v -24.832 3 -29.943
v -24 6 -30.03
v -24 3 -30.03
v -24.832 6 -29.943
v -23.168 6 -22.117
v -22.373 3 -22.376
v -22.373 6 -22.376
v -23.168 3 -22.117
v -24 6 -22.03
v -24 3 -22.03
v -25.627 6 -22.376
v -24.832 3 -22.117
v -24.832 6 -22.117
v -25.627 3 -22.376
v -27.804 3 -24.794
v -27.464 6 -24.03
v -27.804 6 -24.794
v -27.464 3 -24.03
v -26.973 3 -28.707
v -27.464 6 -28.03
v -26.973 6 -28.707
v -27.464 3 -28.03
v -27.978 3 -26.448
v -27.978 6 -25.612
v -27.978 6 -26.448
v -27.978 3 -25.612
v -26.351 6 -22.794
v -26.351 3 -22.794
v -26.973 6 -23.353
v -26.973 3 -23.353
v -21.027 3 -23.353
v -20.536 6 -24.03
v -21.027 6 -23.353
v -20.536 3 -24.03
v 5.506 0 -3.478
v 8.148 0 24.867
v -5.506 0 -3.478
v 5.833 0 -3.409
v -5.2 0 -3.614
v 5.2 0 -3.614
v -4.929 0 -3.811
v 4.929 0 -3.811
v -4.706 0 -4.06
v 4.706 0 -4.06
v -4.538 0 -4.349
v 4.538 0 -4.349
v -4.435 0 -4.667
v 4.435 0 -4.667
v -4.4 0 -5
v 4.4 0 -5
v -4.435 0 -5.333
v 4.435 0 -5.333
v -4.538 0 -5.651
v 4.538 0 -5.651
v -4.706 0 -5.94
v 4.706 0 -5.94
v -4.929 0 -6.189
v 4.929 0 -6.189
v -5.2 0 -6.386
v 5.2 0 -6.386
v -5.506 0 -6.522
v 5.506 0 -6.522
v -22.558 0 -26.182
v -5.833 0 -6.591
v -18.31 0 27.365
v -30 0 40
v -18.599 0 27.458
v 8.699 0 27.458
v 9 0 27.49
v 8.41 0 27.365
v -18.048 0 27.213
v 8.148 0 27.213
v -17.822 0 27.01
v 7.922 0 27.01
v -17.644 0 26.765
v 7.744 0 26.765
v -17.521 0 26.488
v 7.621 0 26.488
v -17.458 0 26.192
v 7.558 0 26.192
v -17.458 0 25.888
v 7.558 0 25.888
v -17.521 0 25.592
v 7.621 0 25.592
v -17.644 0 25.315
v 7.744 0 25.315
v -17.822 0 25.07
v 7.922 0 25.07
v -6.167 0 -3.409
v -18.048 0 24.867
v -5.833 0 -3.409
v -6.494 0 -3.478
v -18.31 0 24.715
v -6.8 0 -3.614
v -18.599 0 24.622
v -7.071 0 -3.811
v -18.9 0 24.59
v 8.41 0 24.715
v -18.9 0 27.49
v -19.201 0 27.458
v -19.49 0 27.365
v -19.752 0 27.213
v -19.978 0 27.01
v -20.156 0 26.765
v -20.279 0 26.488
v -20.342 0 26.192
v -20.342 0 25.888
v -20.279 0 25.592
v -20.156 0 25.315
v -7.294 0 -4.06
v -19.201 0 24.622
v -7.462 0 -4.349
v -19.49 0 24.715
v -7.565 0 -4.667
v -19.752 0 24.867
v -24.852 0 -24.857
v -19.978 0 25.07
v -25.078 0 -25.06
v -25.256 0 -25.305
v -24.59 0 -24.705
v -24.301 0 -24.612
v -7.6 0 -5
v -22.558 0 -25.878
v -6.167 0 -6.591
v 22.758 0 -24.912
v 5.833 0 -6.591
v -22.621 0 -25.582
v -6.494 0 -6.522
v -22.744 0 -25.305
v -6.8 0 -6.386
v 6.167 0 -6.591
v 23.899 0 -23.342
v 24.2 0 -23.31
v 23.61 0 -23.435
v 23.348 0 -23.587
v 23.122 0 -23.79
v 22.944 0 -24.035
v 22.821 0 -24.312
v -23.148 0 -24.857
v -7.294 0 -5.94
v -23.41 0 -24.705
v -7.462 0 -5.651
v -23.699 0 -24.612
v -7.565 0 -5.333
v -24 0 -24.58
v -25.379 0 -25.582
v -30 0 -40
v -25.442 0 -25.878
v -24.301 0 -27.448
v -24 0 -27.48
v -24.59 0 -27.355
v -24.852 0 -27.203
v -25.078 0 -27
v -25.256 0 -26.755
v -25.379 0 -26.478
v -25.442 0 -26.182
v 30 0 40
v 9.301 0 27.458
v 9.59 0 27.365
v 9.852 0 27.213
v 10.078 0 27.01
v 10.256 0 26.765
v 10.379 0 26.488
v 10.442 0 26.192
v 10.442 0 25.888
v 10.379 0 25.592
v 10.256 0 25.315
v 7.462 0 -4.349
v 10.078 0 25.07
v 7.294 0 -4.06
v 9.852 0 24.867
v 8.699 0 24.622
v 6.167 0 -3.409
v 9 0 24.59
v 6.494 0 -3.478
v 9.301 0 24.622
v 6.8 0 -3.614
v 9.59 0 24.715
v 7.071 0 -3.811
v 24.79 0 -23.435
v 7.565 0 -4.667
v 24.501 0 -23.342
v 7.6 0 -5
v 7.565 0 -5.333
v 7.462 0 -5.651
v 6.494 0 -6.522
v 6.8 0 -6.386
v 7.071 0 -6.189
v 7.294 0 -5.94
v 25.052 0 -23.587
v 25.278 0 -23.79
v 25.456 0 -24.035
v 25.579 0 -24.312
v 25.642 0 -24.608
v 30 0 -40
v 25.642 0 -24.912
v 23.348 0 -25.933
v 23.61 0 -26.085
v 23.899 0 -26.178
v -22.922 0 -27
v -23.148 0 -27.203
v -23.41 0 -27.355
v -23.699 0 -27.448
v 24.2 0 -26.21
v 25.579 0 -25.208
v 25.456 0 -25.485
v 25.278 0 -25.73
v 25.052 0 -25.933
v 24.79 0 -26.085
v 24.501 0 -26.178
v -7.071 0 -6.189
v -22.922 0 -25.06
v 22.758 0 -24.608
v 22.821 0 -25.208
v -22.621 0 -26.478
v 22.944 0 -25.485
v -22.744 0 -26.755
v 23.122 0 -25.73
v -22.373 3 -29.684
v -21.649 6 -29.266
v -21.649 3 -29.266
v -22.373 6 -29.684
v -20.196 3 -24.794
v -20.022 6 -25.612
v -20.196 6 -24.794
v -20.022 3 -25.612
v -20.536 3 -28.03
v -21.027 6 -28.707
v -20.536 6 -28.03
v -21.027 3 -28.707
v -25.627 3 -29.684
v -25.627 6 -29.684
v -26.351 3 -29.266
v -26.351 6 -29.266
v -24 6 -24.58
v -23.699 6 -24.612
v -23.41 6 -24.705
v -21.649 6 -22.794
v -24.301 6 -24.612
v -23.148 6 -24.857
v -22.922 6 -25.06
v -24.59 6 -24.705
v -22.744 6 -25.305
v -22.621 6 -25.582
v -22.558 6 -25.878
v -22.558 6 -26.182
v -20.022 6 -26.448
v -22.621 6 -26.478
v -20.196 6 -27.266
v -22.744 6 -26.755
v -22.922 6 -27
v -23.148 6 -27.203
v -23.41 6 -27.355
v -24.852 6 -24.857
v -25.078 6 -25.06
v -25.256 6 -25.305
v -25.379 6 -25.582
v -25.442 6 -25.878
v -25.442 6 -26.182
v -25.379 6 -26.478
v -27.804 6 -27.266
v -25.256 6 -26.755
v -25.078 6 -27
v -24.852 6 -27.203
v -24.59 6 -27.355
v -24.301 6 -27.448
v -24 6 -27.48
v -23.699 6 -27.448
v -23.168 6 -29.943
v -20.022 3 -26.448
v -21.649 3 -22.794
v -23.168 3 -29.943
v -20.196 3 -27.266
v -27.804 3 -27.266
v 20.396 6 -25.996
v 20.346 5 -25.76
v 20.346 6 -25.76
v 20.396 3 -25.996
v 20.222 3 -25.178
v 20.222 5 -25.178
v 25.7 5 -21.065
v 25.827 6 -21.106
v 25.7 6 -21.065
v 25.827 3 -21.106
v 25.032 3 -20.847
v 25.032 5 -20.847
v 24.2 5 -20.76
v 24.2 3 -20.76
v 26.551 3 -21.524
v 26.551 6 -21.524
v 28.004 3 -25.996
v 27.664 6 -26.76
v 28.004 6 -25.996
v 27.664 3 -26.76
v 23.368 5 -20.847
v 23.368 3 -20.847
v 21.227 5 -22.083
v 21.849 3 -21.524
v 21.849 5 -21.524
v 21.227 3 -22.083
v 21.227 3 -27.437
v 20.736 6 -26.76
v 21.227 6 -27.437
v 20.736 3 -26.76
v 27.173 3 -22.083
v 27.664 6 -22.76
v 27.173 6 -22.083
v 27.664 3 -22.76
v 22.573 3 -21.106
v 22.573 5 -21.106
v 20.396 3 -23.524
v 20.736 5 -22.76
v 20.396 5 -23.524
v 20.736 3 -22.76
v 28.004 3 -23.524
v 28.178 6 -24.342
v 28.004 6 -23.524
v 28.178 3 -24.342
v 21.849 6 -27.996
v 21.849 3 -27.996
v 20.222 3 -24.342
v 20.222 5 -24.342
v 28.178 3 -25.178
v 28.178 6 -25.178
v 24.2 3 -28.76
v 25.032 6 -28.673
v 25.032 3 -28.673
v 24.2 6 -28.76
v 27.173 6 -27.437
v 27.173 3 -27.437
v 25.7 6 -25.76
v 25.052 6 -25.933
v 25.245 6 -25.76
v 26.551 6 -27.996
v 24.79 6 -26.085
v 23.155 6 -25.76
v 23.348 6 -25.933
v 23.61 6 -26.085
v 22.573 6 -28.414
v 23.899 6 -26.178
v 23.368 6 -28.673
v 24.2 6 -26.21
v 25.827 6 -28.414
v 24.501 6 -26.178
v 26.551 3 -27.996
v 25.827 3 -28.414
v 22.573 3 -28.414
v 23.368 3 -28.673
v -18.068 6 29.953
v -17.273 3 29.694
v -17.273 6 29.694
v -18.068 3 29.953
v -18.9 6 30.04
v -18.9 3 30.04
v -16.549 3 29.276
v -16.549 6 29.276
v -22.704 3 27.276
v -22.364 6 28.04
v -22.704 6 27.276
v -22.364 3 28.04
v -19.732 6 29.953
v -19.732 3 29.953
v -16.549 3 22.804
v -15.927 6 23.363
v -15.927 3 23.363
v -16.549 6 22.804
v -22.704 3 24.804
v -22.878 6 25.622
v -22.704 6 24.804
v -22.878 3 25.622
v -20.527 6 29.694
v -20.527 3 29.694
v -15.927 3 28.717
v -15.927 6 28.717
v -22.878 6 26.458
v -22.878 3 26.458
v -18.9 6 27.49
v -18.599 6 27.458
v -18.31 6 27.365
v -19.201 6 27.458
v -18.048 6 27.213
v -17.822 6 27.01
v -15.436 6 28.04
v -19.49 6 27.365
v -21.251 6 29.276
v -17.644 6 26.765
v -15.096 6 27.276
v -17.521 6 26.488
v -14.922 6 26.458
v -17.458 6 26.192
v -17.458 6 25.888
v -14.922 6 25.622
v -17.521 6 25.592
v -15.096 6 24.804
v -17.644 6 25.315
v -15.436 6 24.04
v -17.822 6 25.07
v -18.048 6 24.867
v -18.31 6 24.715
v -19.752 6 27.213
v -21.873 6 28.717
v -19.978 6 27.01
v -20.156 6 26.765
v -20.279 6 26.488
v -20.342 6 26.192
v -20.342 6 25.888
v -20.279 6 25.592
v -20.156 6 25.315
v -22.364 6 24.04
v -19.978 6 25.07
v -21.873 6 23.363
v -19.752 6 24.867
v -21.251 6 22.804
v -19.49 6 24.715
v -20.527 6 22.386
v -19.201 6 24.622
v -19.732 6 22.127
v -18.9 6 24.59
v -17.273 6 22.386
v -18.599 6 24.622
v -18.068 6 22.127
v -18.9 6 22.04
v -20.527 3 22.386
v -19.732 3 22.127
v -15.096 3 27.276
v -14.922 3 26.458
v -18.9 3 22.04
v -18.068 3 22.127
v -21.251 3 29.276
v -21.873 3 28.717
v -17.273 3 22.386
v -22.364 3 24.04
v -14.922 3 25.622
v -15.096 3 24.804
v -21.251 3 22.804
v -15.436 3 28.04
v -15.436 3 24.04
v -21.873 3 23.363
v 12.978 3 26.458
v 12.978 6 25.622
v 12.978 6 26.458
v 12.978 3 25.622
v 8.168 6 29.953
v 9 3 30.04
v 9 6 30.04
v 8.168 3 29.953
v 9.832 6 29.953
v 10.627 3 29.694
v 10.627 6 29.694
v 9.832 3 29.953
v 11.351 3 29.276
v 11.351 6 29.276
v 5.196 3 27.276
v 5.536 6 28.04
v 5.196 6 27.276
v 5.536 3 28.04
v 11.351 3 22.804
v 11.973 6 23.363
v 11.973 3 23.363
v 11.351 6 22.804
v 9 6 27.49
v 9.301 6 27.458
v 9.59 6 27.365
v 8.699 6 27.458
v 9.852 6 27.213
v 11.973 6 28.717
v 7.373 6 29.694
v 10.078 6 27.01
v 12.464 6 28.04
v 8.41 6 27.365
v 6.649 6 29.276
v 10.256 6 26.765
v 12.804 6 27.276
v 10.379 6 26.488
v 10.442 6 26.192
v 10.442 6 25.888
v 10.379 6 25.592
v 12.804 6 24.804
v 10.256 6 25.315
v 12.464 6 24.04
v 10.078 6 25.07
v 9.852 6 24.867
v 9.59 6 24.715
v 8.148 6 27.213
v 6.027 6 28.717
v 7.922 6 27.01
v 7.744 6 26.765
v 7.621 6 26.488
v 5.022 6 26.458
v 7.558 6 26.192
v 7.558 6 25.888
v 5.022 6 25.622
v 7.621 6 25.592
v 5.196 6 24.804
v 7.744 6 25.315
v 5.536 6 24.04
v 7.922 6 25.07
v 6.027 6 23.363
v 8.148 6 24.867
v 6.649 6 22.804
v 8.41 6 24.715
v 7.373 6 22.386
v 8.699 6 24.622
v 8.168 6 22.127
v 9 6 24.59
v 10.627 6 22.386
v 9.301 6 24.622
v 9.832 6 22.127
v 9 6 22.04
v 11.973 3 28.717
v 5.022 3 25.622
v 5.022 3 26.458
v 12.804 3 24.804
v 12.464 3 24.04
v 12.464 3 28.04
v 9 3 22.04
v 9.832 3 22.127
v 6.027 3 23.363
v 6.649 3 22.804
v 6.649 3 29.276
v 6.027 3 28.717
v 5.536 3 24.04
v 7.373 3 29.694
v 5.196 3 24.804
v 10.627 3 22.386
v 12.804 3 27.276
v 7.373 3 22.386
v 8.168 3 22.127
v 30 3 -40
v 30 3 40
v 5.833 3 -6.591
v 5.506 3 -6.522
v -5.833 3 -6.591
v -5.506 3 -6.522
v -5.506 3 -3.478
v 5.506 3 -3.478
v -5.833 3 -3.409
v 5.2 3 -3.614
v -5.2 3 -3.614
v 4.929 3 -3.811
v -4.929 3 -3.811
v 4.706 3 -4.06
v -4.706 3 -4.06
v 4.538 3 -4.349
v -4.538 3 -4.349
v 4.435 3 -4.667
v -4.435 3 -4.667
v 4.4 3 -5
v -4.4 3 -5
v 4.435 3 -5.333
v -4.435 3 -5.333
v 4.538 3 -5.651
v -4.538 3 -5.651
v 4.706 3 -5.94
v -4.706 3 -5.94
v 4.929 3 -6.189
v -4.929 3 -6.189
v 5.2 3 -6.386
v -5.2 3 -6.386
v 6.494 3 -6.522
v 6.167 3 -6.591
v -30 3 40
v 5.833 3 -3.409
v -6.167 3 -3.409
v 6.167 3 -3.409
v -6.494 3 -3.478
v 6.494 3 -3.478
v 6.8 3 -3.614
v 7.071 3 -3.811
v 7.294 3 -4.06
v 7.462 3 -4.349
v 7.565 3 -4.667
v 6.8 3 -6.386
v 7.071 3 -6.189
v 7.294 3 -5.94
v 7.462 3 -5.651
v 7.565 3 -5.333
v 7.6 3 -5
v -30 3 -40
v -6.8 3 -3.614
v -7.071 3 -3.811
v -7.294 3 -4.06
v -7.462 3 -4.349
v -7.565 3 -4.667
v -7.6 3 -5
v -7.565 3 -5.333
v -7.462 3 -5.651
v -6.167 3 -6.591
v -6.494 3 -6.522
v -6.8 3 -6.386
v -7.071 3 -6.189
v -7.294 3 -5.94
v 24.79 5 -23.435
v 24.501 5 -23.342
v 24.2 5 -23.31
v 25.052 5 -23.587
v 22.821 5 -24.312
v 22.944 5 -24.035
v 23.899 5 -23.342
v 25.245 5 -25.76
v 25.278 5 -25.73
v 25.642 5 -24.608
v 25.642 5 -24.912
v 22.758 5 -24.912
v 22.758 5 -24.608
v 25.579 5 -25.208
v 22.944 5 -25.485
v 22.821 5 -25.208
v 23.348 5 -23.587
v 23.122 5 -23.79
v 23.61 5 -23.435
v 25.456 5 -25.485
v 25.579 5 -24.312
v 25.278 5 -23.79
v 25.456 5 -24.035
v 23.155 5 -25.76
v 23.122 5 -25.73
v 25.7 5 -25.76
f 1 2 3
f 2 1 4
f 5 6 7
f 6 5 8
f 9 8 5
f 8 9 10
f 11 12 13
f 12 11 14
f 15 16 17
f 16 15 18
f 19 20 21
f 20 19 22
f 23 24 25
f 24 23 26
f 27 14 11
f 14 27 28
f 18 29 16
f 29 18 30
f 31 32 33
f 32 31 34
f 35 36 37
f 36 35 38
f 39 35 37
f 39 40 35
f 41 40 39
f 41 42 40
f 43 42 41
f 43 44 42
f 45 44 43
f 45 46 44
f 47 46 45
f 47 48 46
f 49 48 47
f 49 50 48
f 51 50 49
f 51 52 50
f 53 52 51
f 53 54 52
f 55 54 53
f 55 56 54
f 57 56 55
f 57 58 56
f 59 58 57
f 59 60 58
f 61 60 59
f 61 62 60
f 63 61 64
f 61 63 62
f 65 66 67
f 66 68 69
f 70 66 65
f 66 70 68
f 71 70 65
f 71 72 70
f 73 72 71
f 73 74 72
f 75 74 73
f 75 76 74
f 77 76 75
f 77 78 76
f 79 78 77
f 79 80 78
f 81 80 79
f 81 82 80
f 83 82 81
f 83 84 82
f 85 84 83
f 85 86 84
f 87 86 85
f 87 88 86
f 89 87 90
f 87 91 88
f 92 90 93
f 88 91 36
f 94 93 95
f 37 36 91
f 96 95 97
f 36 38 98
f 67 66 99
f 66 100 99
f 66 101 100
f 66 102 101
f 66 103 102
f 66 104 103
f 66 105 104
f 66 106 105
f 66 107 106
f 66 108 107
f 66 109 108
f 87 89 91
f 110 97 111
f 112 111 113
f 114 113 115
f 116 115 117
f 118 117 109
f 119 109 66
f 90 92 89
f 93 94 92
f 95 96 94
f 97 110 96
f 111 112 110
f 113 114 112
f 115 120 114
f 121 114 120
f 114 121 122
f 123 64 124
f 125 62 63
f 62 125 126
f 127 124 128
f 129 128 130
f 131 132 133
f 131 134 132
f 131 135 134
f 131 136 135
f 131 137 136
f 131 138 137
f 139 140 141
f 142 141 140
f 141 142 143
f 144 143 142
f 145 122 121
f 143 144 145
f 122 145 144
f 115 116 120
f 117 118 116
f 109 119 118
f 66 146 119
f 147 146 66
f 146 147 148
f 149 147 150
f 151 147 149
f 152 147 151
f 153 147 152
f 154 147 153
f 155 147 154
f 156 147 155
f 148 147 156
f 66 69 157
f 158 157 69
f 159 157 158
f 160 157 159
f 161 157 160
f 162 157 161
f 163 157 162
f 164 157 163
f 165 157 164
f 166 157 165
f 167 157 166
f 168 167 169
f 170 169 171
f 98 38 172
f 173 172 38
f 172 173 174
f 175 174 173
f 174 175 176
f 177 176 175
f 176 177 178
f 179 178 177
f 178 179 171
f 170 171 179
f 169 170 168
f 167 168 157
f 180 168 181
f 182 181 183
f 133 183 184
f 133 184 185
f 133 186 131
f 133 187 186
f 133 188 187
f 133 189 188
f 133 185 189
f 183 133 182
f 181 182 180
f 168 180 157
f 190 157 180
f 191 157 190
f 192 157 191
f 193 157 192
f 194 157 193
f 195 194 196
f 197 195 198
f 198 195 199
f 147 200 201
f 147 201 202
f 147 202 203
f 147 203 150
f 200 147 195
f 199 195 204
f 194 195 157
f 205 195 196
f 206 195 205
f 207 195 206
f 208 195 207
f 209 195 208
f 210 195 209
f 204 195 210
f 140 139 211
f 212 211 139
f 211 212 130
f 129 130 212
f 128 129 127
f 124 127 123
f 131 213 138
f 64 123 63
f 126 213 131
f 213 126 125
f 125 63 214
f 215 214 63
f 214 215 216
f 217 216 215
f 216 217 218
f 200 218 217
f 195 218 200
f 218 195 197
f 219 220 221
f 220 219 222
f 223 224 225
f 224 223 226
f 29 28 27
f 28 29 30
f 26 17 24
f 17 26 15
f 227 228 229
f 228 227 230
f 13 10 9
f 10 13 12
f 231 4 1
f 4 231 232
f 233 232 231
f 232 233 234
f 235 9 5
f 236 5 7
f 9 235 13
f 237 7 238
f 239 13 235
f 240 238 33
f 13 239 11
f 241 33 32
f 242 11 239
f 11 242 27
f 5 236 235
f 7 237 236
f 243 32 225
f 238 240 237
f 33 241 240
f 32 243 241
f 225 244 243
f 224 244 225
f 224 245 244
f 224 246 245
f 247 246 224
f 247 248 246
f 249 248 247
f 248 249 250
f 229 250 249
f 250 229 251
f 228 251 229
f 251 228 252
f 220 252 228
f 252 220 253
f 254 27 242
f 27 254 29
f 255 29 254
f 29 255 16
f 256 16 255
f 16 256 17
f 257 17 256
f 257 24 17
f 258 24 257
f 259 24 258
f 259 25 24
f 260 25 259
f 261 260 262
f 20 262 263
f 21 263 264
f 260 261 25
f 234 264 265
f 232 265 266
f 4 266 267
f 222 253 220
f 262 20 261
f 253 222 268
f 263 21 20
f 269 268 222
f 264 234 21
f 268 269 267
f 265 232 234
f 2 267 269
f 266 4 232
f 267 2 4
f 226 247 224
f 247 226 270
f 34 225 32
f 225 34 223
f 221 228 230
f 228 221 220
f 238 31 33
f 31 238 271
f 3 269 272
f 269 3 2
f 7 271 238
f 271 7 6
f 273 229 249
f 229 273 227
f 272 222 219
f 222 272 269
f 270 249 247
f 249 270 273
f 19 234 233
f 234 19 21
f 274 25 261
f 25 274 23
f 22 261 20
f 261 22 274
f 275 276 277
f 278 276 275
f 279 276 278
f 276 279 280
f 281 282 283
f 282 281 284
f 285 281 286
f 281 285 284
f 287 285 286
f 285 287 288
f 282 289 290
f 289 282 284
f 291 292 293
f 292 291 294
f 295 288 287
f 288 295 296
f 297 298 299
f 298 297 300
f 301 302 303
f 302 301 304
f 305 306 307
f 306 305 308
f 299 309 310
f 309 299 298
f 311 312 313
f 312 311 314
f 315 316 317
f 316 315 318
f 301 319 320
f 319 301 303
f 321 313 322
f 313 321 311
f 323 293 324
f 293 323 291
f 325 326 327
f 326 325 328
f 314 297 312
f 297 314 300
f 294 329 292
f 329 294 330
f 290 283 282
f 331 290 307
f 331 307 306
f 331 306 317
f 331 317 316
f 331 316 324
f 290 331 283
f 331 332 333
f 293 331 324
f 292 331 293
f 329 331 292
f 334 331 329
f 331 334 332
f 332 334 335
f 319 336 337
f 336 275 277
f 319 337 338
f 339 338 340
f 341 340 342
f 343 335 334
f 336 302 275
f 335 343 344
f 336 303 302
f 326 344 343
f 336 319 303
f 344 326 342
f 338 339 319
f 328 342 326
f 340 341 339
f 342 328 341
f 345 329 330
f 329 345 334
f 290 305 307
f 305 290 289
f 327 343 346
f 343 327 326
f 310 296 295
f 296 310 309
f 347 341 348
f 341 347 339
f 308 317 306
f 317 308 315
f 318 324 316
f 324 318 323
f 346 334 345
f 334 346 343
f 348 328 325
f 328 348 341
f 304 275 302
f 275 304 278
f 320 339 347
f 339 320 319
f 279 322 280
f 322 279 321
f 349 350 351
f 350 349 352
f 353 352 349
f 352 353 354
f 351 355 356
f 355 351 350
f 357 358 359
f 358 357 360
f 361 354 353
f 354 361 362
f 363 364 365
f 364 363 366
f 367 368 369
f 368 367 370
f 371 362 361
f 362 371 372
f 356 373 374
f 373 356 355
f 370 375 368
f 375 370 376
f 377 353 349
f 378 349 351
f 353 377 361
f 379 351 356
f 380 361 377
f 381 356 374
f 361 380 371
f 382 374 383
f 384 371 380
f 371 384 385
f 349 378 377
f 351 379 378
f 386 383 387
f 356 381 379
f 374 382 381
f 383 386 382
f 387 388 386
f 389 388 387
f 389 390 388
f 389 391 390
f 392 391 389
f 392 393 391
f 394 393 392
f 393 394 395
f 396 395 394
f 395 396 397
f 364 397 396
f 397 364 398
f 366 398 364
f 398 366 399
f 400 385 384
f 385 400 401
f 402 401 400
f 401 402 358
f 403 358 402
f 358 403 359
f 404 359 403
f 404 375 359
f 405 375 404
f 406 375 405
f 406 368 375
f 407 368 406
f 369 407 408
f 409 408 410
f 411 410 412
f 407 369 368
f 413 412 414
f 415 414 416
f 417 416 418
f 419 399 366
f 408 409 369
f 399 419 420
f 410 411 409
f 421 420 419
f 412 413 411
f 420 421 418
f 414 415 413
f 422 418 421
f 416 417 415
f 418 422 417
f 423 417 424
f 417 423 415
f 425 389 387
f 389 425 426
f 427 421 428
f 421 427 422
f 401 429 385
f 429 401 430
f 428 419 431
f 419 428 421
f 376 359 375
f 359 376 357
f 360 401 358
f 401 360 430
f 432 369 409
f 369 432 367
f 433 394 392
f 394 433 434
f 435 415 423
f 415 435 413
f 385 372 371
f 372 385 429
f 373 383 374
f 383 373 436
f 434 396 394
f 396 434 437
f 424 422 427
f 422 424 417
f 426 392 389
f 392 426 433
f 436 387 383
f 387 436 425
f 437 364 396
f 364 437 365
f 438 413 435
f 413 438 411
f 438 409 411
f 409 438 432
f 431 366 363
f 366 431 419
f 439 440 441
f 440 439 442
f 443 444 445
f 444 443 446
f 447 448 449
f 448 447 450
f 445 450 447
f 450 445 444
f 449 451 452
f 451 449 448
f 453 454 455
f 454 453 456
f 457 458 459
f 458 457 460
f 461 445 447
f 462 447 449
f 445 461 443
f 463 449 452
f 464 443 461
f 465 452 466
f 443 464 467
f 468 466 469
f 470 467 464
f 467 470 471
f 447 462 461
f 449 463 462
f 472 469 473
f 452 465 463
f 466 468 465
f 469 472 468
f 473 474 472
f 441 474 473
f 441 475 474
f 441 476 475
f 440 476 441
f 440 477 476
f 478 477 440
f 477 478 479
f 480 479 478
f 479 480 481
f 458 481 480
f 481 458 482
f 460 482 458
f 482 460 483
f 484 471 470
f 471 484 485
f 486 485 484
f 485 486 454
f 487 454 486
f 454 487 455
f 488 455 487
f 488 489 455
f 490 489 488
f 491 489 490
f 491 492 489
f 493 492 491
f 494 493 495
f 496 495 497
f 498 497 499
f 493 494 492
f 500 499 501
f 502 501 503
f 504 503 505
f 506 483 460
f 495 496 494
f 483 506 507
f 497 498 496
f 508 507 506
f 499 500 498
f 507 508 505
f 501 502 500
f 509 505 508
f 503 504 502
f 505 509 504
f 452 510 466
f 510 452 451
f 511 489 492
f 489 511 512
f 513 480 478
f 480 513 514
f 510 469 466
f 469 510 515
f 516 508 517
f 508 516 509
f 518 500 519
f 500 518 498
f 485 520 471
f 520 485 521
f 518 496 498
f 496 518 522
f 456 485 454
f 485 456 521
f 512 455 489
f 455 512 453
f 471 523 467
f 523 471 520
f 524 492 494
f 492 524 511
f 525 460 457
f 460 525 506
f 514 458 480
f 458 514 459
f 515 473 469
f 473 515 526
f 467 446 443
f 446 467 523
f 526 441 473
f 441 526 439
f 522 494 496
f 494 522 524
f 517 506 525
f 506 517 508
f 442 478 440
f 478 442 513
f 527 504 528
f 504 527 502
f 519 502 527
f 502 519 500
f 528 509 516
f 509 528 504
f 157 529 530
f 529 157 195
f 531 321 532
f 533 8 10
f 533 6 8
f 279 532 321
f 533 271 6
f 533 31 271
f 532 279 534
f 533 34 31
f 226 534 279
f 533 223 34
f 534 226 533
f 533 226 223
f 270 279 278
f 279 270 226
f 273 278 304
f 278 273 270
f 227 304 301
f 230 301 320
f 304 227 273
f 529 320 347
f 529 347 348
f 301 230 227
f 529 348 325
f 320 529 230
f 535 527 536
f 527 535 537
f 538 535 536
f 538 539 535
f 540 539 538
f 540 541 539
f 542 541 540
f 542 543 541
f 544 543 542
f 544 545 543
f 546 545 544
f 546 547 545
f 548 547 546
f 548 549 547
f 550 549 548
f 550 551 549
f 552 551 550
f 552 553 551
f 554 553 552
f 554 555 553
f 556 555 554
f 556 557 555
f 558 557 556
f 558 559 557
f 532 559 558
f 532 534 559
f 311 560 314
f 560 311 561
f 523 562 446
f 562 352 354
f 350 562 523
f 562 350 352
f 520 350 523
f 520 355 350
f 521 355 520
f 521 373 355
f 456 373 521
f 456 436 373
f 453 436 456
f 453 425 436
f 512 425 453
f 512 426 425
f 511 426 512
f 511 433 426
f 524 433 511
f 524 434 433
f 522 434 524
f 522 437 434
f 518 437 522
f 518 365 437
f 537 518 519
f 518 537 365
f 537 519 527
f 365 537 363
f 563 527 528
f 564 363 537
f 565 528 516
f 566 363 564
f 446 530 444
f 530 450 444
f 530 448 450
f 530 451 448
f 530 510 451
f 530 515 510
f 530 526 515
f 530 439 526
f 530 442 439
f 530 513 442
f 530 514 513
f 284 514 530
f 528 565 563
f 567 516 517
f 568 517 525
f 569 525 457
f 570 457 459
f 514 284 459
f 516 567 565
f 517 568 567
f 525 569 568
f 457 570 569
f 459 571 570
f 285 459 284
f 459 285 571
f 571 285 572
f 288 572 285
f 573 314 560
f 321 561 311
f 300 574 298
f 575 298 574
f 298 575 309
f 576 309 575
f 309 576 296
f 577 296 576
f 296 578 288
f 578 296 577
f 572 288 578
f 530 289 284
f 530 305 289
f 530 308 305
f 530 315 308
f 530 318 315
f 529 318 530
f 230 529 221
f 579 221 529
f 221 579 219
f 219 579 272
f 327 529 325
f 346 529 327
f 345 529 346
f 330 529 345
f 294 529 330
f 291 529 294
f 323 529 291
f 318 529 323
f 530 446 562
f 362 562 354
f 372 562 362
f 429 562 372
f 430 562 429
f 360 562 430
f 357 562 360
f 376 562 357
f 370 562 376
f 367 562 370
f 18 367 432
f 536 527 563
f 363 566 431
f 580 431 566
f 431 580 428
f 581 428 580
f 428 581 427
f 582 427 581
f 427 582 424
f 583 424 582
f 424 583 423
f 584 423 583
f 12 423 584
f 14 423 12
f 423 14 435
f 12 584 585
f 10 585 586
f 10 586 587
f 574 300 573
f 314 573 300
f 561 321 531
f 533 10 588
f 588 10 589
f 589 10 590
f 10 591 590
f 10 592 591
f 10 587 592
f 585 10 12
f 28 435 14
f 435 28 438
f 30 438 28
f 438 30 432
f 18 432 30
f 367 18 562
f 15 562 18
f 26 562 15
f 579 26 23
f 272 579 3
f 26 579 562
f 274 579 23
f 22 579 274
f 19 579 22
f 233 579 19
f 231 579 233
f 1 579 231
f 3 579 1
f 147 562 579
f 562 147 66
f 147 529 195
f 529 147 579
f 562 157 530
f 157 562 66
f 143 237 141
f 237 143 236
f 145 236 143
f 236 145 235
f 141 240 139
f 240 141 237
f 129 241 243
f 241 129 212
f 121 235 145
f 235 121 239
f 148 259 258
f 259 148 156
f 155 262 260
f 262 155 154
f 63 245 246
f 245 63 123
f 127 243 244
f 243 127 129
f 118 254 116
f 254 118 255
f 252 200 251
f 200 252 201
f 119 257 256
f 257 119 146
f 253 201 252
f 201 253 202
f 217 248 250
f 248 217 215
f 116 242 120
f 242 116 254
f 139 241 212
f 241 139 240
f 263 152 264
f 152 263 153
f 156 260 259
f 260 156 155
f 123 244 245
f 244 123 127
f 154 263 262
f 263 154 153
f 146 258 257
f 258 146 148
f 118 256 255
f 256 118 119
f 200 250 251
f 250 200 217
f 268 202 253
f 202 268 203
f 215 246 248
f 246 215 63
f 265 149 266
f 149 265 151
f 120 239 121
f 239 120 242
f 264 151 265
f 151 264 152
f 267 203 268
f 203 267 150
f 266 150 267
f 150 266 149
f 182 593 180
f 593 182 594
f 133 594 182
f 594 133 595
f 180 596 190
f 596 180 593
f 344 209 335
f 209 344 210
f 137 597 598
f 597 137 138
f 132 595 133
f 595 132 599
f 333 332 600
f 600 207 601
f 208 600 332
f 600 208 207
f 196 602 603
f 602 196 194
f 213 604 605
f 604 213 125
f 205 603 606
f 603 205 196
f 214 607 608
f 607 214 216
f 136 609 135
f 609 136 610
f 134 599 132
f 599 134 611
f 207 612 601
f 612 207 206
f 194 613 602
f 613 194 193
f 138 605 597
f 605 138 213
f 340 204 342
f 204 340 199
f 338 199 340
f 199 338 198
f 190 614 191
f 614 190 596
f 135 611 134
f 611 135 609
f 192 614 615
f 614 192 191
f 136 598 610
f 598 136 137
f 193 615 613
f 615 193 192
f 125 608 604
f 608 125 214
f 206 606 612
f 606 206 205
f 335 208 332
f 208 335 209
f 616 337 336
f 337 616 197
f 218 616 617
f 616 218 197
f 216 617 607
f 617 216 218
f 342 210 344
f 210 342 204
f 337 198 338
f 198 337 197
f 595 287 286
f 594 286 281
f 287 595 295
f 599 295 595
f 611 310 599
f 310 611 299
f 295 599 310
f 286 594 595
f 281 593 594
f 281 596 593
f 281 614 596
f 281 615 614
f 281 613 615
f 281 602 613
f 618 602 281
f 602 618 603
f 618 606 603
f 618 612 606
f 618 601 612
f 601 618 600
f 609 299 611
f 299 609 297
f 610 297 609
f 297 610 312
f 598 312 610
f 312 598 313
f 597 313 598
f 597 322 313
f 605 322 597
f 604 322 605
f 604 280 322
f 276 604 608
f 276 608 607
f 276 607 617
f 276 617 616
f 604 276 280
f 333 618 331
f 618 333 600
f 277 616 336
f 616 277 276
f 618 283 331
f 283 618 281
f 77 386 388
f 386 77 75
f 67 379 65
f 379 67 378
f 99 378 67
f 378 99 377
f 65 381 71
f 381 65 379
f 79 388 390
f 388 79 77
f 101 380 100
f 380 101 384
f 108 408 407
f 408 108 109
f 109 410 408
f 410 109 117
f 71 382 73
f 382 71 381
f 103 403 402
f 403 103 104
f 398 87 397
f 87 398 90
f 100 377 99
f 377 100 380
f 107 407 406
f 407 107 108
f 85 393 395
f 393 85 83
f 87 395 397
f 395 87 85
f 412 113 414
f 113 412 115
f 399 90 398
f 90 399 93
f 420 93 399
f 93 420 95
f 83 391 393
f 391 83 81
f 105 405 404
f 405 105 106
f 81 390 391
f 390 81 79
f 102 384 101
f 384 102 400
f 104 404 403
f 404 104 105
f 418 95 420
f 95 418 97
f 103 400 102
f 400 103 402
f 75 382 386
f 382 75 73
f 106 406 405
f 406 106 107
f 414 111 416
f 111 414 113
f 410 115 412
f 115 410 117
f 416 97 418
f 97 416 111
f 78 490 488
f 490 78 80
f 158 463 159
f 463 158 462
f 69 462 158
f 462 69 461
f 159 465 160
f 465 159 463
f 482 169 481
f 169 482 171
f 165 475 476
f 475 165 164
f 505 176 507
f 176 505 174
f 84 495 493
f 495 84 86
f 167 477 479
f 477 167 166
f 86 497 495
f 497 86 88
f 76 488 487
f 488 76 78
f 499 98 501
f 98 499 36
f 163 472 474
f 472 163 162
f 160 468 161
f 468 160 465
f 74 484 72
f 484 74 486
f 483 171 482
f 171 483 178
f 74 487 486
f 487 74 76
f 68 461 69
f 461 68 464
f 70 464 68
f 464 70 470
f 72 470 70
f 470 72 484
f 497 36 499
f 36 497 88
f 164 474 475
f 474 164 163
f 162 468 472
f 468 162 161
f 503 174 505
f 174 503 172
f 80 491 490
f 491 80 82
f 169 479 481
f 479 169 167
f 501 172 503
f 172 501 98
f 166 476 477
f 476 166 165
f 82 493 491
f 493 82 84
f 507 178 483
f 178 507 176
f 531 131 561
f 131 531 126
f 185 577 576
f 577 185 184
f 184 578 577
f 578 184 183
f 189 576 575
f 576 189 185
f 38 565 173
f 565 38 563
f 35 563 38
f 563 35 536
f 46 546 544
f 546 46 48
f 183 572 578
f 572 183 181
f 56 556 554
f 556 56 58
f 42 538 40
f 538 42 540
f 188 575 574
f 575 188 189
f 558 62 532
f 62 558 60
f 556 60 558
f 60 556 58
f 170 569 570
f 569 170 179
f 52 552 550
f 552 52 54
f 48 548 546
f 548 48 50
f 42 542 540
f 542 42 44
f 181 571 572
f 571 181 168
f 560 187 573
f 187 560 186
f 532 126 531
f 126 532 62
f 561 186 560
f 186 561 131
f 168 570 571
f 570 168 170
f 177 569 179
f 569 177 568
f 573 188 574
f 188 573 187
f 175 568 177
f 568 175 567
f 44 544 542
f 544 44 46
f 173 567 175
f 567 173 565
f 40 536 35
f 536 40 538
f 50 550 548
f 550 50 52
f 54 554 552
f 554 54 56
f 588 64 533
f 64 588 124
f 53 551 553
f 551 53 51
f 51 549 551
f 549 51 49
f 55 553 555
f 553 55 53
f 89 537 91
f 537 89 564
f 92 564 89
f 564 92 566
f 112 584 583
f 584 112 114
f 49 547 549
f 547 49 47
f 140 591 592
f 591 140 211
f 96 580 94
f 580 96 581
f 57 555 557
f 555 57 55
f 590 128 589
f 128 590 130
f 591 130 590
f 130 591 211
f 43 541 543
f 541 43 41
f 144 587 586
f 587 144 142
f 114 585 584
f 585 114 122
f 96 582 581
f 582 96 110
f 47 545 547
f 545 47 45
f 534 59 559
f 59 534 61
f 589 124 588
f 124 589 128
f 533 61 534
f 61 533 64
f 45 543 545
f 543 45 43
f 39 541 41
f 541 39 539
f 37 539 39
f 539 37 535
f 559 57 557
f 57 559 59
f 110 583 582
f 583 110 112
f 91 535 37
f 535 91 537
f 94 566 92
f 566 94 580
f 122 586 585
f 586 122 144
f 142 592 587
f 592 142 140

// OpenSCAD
$fn=30;

//assembly
rotate([-90,0,0])arduino_plate();
//translate([0,-22.35,0])rotate([90,0,0])motor_support();
//translate([0,-40,-20])battery_holder();

module arduino_plate(){
difference(){
union(){
translate([0,0,1.5])cube([60,80,3],center=true);
translate([-26.5,40,0])rotate([0,0,-90]){
translate([13.97,2.5,0])cylinder(d=8,h=6);
translate([15.24,50.7,0])cylinder(d=8,h=6);
translate([66.04,7.6,0])cylinder(d=8,h=6);
translate([66.04,35.5,0])cylinder(d=8,h=6);
}
}
translate([-26.5,40,0])rotate([0,0,-90]){
translate([13.97,2.5,0])cylinder(d=2.9,h=10);
translate([15.24,50.7,0])cylinder(d=2.9,h=10);
translate([14.24,46.2,5])cube(6);
translate([66.04,7.6,0])cylinder(d=2.9,h=10);
translate([66.04,35.5,0])cylinder(d=2.9,h=10);
}
//translate([15,20,-1])cylinder(d=3.2,h=5);    
//translate([-15,20,-1])cylinder(d=3.2,h=5);
translate([6,5,-1])cylinder(d=3.2,h=5);    
translate([-6,5,-1])cylinder(d=3.2,h=5);
//translate([15,-10,-1])cylinder(d=3.2,h=5);    
//translate([-15,-10,-1])cylinder(d=3.2,h=5);
}
}

module motor_support(){
$fn=30;

difference(){
translate([-11.5,8,0])cube([23,14,22.35]);
//translate([-12.5,15,-10])cube([25,12,50]);
translate([0,19.1,2.465])rotate([0,90,0])
cylinder(d=2.8,h=50,center=true,$fn=30);
translate([0,19.1,19.885])rotate([0,90,0])
cylinder(d=2.8,h=50,center=true,$fn=30);
translate([6,12,-1])cylinder(d=2.8,h=30);    
translate([-6,12,-1])cylinder(d=2.8,h=30);    
}
}

module battery_holder(){
translate([-7.5,-7.5,0])
difference(){
minkowski(){
cube([15,15,0.001]);
cylinder(h=51,d=19);
}
minkowski(){
translate([0,0,2])cube([15,15,5]);
cylinder(h=51,d=15);
}
}
}
